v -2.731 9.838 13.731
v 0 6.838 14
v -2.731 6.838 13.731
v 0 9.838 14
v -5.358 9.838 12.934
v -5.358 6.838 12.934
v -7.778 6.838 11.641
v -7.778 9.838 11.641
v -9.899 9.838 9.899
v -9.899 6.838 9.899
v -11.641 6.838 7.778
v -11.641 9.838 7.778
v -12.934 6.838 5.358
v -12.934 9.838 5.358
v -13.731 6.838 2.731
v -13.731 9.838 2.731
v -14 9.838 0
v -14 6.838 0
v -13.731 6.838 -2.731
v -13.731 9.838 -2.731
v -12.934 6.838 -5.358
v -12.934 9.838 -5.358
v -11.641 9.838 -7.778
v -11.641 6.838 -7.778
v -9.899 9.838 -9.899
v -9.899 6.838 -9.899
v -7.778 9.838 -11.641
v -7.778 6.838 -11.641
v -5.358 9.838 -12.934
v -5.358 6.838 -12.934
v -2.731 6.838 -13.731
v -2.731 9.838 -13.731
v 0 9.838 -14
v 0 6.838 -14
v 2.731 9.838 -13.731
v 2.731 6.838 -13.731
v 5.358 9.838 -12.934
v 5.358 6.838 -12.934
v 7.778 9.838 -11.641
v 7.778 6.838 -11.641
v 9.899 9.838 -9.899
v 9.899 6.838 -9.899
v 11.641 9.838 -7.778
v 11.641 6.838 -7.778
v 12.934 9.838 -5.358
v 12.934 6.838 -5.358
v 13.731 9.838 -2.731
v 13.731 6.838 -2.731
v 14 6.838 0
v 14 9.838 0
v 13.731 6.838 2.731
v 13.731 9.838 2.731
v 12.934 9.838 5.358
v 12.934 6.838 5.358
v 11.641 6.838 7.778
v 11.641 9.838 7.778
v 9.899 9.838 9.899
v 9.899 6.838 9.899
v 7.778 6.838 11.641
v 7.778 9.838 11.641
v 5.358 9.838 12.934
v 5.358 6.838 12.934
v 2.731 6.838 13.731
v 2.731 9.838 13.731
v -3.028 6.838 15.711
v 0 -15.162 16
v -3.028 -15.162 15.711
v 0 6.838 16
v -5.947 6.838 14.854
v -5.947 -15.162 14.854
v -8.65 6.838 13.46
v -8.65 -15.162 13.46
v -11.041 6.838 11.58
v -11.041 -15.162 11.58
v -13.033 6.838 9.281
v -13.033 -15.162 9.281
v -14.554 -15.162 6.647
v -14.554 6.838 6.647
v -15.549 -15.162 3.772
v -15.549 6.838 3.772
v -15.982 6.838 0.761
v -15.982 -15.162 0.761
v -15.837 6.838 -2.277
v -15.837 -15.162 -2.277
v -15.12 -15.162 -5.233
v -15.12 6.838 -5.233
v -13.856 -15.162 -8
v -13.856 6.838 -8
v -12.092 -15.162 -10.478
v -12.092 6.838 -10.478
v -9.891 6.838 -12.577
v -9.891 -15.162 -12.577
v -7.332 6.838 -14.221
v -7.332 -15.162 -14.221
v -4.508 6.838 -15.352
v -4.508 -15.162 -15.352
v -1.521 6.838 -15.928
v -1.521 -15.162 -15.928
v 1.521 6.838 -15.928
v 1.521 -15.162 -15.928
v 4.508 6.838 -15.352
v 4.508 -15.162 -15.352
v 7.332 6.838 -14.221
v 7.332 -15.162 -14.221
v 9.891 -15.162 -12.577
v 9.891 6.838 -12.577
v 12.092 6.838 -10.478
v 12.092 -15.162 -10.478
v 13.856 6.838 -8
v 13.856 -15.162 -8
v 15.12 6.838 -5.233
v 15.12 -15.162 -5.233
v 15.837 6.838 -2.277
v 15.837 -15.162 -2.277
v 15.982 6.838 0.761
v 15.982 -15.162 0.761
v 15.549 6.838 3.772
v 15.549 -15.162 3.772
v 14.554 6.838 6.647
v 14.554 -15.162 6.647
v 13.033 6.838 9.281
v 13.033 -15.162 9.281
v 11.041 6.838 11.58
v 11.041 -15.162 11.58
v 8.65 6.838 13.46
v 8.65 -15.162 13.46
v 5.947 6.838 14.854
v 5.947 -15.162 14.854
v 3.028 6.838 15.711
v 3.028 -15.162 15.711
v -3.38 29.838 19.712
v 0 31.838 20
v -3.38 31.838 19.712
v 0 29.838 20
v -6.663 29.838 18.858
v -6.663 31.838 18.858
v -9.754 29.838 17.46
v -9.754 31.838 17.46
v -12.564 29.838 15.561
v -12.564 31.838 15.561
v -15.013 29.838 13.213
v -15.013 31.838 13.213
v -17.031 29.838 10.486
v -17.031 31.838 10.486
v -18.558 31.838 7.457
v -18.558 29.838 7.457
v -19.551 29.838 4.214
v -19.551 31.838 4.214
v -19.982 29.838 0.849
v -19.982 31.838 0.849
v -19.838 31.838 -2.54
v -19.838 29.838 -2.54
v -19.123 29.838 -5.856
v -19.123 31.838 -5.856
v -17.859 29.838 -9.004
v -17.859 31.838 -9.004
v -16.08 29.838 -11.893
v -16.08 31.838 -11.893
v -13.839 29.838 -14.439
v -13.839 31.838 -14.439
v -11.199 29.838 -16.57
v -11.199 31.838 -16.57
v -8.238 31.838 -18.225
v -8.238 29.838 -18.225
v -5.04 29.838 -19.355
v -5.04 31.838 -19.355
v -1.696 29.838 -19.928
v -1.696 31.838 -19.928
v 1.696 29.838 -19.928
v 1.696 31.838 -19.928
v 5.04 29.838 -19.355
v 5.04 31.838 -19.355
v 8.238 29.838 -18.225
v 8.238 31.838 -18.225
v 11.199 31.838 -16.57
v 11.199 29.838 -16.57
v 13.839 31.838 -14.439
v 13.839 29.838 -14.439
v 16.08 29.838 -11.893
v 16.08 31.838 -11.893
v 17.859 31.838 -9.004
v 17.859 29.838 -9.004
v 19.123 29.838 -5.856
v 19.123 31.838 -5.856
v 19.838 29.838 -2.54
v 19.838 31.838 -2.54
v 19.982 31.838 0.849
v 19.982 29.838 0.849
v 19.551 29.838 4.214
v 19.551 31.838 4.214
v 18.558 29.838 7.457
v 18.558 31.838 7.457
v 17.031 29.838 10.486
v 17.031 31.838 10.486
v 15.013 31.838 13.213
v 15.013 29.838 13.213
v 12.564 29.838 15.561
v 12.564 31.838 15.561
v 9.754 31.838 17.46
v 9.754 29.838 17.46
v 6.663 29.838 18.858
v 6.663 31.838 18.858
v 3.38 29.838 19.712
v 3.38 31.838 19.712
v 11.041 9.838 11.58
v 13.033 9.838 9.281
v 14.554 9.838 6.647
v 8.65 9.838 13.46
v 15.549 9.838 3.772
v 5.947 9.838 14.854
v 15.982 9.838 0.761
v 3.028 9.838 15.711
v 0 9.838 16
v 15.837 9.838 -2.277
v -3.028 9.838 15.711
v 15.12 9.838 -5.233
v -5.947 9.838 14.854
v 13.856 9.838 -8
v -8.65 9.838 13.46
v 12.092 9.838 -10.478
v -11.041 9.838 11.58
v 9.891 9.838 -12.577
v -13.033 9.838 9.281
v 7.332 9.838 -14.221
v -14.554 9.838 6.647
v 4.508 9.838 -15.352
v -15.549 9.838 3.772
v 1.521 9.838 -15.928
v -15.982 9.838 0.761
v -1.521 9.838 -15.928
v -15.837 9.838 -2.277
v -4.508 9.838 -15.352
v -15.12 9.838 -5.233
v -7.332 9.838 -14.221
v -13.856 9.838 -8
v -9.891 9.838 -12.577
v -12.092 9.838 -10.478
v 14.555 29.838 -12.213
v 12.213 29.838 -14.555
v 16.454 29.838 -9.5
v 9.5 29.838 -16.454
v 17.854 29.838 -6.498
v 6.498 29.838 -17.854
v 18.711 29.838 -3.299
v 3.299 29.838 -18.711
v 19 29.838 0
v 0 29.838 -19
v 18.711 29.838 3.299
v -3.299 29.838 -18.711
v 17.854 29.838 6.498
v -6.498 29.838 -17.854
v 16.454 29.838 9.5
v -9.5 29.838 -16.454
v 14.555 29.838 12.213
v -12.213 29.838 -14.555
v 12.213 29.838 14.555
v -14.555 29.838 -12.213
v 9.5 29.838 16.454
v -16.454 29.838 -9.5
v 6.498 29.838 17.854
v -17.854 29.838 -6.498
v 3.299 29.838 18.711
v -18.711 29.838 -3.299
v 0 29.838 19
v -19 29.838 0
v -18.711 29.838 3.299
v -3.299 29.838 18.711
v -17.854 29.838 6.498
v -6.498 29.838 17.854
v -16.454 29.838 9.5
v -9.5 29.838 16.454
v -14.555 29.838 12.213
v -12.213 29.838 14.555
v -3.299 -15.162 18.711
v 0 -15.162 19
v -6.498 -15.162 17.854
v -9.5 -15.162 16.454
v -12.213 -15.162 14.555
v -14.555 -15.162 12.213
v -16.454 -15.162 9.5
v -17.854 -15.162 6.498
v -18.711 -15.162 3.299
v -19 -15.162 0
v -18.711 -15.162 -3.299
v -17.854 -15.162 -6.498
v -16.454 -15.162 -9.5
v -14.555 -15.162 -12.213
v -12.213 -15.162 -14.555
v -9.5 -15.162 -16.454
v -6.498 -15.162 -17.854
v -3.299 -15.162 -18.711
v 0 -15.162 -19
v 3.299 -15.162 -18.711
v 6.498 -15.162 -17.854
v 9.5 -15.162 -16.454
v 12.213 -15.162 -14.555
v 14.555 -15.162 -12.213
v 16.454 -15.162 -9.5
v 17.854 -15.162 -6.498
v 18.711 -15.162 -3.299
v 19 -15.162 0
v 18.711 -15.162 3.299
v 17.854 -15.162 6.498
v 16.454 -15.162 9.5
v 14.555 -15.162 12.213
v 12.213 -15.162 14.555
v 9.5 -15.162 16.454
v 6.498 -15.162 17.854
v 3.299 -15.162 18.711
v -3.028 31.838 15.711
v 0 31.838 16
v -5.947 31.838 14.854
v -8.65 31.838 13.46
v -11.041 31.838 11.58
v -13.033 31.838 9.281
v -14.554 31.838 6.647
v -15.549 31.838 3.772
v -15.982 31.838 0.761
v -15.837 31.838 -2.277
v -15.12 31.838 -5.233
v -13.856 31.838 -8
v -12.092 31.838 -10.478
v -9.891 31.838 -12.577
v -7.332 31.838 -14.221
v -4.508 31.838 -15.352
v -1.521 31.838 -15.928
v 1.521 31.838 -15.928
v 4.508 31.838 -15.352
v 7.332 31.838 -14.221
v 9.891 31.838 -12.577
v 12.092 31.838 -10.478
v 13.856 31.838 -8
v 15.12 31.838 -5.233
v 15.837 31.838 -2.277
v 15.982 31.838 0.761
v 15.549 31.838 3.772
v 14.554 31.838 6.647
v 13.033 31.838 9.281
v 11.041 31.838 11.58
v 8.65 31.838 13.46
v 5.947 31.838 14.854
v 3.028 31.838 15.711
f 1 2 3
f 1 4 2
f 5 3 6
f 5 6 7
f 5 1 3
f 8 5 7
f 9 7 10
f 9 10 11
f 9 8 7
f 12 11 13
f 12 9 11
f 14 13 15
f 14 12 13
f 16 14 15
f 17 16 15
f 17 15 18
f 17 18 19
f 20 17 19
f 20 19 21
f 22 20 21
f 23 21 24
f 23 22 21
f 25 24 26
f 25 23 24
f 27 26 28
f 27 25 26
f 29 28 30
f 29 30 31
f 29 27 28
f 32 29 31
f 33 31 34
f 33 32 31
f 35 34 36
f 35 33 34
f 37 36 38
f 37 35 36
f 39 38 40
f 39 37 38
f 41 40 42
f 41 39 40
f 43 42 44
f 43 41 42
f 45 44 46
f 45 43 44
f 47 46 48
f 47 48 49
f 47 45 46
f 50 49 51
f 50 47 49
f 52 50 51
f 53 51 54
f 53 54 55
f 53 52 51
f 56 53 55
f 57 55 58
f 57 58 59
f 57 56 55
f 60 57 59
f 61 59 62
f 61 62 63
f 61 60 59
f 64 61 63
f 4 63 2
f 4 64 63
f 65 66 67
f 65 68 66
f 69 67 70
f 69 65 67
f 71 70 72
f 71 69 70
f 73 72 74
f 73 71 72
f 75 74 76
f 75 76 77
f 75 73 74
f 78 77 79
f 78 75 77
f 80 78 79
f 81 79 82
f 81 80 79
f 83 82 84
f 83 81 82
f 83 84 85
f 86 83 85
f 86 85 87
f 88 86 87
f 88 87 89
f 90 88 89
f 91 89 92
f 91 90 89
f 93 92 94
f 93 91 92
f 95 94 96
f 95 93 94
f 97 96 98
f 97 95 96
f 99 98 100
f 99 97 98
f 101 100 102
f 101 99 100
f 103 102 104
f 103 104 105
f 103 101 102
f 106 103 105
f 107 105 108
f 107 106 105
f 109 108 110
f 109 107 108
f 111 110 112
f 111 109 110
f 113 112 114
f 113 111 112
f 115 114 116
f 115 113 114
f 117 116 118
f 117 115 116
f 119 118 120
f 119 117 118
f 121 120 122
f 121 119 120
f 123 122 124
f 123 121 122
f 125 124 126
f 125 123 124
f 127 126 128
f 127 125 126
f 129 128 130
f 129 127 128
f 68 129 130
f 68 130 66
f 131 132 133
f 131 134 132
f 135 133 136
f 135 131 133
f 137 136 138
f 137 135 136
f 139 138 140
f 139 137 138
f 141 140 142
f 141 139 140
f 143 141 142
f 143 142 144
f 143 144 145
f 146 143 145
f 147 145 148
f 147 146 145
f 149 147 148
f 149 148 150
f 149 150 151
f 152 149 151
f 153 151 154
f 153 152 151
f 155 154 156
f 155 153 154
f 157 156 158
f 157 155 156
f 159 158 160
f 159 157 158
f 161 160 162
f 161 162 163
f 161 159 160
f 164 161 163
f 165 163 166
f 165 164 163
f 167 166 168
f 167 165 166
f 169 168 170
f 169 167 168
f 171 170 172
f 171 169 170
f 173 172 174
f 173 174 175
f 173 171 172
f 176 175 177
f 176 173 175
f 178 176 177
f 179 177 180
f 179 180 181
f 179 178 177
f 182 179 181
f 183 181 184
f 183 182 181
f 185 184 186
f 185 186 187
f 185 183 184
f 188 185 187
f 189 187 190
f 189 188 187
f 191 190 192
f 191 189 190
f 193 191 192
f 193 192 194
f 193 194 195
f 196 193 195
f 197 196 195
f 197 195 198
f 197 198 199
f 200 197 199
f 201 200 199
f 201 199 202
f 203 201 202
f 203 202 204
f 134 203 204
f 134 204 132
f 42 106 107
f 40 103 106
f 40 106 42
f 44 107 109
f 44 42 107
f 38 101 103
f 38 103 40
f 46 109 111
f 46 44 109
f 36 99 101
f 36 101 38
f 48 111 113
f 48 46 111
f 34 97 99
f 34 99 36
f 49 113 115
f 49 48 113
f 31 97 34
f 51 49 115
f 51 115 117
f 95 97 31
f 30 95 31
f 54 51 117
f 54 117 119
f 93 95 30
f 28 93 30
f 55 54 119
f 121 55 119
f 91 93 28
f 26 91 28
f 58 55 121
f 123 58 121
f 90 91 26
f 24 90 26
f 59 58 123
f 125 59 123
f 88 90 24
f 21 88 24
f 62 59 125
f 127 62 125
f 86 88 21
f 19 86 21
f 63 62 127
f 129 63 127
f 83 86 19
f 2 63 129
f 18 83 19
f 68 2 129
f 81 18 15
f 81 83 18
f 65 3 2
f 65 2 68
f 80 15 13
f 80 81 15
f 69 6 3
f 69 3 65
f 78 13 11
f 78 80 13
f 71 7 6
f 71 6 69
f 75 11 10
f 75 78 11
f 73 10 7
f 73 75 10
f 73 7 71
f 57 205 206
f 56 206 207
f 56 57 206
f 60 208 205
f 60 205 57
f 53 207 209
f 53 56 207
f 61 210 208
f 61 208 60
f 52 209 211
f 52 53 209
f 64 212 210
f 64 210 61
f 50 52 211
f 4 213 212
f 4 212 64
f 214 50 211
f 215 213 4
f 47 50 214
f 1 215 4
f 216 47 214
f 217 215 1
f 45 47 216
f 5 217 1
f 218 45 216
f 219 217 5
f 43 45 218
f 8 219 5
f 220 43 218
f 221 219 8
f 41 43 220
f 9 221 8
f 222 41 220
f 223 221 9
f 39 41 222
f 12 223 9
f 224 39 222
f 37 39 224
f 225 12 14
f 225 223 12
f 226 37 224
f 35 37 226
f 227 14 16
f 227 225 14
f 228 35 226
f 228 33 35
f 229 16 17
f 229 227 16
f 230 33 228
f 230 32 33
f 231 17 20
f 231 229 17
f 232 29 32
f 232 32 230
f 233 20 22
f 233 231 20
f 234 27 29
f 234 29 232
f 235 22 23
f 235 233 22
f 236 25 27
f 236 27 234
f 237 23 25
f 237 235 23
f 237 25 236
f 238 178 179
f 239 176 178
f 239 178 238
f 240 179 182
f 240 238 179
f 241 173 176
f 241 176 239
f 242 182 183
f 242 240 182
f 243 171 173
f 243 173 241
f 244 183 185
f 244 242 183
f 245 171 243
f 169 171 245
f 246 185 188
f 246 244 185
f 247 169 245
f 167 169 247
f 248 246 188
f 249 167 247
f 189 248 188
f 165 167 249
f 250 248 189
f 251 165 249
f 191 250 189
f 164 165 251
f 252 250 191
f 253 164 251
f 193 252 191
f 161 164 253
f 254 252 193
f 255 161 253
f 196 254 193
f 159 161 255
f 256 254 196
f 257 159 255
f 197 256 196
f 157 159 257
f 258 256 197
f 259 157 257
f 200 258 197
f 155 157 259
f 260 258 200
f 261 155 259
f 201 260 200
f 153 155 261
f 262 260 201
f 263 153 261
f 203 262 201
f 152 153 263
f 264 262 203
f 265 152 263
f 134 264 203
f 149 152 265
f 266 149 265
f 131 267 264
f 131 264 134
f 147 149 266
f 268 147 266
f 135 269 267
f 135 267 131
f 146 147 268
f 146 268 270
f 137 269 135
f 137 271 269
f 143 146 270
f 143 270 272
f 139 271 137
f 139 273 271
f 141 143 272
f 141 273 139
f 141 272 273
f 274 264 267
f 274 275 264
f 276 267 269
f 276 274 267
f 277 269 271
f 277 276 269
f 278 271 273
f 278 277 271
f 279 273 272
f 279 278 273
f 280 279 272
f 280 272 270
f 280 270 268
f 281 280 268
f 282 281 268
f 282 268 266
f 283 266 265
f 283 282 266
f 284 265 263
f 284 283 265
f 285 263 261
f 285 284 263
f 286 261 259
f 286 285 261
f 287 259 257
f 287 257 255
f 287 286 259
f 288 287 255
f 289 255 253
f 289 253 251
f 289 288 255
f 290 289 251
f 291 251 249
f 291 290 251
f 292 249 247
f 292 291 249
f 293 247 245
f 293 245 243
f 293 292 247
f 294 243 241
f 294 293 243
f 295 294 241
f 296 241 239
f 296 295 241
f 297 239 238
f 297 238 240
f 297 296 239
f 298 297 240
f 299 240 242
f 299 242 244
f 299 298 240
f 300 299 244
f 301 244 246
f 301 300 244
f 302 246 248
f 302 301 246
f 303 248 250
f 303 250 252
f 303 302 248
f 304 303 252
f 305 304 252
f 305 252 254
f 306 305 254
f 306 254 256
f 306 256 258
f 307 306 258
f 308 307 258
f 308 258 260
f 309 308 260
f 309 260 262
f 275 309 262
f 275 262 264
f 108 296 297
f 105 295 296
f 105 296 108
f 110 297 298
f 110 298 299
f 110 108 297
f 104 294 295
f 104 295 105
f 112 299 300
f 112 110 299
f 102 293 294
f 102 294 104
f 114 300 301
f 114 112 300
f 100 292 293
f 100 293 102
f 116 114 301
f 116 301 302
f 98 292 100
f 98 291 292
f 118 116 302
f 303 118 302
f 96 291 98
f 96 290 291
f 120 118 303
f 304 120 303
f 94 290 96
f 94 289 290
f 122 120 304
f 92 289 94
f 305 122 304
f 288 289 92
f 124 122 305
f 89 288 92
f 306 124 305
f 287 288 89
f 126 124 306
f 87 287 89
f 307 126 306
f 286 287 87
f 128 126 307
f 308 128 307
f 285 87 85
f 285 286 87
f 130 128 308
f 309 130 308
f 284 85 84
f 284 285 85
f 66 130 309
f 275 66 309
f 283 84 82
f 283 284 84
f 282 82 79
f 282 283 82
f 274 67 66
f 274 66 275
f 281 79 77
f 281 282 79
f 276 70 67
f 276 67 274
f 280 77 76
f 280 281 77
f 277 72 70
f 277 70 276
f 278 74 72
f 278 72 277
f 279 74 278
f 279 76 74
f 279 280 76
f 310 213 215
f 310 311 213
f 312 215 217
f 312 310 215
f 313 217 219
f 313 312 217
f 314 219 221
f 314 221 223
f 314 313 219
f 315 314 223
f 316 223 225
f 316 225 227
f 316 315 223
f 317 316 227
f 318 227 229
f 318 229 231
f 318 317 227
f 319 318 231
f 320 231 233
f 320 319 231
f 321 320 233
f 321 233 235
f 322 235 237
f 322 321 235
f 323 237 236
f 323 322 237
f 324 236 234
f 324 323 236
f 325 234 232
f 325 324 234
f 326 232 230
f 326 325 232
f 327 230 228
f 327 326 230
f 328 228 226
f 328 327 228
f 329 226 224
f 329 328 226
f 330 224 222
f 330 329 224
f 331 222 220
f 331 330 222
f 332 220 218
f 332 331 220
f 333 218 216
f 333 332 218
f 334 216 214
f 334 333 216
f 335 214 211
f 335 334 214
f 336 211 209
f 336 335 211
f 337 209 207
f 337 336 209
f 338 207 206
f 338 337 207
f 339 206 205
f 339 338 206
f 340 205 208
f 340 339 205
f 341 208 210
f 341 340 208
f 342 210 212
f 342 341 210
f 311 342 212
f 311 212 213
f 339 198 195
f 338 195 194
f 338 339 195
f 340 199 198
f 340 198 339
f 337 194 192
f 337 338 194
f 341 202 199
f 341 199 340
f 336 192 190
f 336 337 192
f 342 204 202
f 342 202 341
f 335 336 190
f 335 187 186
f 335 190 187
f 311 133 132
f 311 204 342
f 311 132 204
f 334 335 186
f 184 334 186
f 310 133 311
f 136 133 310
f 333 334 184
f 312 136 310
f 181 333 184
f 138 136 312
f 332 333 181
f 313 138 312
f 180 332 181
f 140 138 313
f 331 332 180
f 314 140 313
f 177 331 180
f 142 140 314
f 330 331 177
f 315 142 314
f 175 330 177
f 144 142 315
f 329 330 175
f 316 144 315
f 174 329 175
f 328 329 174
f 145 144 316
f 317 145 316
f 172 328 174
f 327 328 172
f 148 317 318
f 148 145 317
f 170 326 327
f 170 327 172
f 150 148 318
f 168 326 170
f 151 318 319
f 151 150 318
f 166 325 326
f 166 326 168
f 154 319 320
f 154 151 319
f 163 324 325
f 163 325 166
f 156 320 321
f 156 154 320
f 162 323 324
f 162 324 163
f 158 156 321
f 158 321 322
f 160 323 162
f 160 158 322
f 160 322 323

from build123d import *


with BuildPart() as part:
    # Esquisse1 → Révolution1 (revolve)
    with BuildSketch(Plane.XY, mode=Mode.PRIVATE) as r_volution1_sk:
        Polygon((-16, -15.162162162), (-16, 6.837837838), (-14, 6.837837838), (-14, 9.837837838), (-16, 9.837837838), (-16, 31.837837838), (-20, 31.837837838), (-20, 29.837837838), (-19, 29.837837838), (-19, -15.162162162), align=None)
    revolve(r_volution1_sk.sketch.rotate(Axis((0, 35.189189189, 0), (0, -1, 0)), 270), axis=Axis((0, 35.189189189, 0), (0, -1, 0)))


solid = part.part
